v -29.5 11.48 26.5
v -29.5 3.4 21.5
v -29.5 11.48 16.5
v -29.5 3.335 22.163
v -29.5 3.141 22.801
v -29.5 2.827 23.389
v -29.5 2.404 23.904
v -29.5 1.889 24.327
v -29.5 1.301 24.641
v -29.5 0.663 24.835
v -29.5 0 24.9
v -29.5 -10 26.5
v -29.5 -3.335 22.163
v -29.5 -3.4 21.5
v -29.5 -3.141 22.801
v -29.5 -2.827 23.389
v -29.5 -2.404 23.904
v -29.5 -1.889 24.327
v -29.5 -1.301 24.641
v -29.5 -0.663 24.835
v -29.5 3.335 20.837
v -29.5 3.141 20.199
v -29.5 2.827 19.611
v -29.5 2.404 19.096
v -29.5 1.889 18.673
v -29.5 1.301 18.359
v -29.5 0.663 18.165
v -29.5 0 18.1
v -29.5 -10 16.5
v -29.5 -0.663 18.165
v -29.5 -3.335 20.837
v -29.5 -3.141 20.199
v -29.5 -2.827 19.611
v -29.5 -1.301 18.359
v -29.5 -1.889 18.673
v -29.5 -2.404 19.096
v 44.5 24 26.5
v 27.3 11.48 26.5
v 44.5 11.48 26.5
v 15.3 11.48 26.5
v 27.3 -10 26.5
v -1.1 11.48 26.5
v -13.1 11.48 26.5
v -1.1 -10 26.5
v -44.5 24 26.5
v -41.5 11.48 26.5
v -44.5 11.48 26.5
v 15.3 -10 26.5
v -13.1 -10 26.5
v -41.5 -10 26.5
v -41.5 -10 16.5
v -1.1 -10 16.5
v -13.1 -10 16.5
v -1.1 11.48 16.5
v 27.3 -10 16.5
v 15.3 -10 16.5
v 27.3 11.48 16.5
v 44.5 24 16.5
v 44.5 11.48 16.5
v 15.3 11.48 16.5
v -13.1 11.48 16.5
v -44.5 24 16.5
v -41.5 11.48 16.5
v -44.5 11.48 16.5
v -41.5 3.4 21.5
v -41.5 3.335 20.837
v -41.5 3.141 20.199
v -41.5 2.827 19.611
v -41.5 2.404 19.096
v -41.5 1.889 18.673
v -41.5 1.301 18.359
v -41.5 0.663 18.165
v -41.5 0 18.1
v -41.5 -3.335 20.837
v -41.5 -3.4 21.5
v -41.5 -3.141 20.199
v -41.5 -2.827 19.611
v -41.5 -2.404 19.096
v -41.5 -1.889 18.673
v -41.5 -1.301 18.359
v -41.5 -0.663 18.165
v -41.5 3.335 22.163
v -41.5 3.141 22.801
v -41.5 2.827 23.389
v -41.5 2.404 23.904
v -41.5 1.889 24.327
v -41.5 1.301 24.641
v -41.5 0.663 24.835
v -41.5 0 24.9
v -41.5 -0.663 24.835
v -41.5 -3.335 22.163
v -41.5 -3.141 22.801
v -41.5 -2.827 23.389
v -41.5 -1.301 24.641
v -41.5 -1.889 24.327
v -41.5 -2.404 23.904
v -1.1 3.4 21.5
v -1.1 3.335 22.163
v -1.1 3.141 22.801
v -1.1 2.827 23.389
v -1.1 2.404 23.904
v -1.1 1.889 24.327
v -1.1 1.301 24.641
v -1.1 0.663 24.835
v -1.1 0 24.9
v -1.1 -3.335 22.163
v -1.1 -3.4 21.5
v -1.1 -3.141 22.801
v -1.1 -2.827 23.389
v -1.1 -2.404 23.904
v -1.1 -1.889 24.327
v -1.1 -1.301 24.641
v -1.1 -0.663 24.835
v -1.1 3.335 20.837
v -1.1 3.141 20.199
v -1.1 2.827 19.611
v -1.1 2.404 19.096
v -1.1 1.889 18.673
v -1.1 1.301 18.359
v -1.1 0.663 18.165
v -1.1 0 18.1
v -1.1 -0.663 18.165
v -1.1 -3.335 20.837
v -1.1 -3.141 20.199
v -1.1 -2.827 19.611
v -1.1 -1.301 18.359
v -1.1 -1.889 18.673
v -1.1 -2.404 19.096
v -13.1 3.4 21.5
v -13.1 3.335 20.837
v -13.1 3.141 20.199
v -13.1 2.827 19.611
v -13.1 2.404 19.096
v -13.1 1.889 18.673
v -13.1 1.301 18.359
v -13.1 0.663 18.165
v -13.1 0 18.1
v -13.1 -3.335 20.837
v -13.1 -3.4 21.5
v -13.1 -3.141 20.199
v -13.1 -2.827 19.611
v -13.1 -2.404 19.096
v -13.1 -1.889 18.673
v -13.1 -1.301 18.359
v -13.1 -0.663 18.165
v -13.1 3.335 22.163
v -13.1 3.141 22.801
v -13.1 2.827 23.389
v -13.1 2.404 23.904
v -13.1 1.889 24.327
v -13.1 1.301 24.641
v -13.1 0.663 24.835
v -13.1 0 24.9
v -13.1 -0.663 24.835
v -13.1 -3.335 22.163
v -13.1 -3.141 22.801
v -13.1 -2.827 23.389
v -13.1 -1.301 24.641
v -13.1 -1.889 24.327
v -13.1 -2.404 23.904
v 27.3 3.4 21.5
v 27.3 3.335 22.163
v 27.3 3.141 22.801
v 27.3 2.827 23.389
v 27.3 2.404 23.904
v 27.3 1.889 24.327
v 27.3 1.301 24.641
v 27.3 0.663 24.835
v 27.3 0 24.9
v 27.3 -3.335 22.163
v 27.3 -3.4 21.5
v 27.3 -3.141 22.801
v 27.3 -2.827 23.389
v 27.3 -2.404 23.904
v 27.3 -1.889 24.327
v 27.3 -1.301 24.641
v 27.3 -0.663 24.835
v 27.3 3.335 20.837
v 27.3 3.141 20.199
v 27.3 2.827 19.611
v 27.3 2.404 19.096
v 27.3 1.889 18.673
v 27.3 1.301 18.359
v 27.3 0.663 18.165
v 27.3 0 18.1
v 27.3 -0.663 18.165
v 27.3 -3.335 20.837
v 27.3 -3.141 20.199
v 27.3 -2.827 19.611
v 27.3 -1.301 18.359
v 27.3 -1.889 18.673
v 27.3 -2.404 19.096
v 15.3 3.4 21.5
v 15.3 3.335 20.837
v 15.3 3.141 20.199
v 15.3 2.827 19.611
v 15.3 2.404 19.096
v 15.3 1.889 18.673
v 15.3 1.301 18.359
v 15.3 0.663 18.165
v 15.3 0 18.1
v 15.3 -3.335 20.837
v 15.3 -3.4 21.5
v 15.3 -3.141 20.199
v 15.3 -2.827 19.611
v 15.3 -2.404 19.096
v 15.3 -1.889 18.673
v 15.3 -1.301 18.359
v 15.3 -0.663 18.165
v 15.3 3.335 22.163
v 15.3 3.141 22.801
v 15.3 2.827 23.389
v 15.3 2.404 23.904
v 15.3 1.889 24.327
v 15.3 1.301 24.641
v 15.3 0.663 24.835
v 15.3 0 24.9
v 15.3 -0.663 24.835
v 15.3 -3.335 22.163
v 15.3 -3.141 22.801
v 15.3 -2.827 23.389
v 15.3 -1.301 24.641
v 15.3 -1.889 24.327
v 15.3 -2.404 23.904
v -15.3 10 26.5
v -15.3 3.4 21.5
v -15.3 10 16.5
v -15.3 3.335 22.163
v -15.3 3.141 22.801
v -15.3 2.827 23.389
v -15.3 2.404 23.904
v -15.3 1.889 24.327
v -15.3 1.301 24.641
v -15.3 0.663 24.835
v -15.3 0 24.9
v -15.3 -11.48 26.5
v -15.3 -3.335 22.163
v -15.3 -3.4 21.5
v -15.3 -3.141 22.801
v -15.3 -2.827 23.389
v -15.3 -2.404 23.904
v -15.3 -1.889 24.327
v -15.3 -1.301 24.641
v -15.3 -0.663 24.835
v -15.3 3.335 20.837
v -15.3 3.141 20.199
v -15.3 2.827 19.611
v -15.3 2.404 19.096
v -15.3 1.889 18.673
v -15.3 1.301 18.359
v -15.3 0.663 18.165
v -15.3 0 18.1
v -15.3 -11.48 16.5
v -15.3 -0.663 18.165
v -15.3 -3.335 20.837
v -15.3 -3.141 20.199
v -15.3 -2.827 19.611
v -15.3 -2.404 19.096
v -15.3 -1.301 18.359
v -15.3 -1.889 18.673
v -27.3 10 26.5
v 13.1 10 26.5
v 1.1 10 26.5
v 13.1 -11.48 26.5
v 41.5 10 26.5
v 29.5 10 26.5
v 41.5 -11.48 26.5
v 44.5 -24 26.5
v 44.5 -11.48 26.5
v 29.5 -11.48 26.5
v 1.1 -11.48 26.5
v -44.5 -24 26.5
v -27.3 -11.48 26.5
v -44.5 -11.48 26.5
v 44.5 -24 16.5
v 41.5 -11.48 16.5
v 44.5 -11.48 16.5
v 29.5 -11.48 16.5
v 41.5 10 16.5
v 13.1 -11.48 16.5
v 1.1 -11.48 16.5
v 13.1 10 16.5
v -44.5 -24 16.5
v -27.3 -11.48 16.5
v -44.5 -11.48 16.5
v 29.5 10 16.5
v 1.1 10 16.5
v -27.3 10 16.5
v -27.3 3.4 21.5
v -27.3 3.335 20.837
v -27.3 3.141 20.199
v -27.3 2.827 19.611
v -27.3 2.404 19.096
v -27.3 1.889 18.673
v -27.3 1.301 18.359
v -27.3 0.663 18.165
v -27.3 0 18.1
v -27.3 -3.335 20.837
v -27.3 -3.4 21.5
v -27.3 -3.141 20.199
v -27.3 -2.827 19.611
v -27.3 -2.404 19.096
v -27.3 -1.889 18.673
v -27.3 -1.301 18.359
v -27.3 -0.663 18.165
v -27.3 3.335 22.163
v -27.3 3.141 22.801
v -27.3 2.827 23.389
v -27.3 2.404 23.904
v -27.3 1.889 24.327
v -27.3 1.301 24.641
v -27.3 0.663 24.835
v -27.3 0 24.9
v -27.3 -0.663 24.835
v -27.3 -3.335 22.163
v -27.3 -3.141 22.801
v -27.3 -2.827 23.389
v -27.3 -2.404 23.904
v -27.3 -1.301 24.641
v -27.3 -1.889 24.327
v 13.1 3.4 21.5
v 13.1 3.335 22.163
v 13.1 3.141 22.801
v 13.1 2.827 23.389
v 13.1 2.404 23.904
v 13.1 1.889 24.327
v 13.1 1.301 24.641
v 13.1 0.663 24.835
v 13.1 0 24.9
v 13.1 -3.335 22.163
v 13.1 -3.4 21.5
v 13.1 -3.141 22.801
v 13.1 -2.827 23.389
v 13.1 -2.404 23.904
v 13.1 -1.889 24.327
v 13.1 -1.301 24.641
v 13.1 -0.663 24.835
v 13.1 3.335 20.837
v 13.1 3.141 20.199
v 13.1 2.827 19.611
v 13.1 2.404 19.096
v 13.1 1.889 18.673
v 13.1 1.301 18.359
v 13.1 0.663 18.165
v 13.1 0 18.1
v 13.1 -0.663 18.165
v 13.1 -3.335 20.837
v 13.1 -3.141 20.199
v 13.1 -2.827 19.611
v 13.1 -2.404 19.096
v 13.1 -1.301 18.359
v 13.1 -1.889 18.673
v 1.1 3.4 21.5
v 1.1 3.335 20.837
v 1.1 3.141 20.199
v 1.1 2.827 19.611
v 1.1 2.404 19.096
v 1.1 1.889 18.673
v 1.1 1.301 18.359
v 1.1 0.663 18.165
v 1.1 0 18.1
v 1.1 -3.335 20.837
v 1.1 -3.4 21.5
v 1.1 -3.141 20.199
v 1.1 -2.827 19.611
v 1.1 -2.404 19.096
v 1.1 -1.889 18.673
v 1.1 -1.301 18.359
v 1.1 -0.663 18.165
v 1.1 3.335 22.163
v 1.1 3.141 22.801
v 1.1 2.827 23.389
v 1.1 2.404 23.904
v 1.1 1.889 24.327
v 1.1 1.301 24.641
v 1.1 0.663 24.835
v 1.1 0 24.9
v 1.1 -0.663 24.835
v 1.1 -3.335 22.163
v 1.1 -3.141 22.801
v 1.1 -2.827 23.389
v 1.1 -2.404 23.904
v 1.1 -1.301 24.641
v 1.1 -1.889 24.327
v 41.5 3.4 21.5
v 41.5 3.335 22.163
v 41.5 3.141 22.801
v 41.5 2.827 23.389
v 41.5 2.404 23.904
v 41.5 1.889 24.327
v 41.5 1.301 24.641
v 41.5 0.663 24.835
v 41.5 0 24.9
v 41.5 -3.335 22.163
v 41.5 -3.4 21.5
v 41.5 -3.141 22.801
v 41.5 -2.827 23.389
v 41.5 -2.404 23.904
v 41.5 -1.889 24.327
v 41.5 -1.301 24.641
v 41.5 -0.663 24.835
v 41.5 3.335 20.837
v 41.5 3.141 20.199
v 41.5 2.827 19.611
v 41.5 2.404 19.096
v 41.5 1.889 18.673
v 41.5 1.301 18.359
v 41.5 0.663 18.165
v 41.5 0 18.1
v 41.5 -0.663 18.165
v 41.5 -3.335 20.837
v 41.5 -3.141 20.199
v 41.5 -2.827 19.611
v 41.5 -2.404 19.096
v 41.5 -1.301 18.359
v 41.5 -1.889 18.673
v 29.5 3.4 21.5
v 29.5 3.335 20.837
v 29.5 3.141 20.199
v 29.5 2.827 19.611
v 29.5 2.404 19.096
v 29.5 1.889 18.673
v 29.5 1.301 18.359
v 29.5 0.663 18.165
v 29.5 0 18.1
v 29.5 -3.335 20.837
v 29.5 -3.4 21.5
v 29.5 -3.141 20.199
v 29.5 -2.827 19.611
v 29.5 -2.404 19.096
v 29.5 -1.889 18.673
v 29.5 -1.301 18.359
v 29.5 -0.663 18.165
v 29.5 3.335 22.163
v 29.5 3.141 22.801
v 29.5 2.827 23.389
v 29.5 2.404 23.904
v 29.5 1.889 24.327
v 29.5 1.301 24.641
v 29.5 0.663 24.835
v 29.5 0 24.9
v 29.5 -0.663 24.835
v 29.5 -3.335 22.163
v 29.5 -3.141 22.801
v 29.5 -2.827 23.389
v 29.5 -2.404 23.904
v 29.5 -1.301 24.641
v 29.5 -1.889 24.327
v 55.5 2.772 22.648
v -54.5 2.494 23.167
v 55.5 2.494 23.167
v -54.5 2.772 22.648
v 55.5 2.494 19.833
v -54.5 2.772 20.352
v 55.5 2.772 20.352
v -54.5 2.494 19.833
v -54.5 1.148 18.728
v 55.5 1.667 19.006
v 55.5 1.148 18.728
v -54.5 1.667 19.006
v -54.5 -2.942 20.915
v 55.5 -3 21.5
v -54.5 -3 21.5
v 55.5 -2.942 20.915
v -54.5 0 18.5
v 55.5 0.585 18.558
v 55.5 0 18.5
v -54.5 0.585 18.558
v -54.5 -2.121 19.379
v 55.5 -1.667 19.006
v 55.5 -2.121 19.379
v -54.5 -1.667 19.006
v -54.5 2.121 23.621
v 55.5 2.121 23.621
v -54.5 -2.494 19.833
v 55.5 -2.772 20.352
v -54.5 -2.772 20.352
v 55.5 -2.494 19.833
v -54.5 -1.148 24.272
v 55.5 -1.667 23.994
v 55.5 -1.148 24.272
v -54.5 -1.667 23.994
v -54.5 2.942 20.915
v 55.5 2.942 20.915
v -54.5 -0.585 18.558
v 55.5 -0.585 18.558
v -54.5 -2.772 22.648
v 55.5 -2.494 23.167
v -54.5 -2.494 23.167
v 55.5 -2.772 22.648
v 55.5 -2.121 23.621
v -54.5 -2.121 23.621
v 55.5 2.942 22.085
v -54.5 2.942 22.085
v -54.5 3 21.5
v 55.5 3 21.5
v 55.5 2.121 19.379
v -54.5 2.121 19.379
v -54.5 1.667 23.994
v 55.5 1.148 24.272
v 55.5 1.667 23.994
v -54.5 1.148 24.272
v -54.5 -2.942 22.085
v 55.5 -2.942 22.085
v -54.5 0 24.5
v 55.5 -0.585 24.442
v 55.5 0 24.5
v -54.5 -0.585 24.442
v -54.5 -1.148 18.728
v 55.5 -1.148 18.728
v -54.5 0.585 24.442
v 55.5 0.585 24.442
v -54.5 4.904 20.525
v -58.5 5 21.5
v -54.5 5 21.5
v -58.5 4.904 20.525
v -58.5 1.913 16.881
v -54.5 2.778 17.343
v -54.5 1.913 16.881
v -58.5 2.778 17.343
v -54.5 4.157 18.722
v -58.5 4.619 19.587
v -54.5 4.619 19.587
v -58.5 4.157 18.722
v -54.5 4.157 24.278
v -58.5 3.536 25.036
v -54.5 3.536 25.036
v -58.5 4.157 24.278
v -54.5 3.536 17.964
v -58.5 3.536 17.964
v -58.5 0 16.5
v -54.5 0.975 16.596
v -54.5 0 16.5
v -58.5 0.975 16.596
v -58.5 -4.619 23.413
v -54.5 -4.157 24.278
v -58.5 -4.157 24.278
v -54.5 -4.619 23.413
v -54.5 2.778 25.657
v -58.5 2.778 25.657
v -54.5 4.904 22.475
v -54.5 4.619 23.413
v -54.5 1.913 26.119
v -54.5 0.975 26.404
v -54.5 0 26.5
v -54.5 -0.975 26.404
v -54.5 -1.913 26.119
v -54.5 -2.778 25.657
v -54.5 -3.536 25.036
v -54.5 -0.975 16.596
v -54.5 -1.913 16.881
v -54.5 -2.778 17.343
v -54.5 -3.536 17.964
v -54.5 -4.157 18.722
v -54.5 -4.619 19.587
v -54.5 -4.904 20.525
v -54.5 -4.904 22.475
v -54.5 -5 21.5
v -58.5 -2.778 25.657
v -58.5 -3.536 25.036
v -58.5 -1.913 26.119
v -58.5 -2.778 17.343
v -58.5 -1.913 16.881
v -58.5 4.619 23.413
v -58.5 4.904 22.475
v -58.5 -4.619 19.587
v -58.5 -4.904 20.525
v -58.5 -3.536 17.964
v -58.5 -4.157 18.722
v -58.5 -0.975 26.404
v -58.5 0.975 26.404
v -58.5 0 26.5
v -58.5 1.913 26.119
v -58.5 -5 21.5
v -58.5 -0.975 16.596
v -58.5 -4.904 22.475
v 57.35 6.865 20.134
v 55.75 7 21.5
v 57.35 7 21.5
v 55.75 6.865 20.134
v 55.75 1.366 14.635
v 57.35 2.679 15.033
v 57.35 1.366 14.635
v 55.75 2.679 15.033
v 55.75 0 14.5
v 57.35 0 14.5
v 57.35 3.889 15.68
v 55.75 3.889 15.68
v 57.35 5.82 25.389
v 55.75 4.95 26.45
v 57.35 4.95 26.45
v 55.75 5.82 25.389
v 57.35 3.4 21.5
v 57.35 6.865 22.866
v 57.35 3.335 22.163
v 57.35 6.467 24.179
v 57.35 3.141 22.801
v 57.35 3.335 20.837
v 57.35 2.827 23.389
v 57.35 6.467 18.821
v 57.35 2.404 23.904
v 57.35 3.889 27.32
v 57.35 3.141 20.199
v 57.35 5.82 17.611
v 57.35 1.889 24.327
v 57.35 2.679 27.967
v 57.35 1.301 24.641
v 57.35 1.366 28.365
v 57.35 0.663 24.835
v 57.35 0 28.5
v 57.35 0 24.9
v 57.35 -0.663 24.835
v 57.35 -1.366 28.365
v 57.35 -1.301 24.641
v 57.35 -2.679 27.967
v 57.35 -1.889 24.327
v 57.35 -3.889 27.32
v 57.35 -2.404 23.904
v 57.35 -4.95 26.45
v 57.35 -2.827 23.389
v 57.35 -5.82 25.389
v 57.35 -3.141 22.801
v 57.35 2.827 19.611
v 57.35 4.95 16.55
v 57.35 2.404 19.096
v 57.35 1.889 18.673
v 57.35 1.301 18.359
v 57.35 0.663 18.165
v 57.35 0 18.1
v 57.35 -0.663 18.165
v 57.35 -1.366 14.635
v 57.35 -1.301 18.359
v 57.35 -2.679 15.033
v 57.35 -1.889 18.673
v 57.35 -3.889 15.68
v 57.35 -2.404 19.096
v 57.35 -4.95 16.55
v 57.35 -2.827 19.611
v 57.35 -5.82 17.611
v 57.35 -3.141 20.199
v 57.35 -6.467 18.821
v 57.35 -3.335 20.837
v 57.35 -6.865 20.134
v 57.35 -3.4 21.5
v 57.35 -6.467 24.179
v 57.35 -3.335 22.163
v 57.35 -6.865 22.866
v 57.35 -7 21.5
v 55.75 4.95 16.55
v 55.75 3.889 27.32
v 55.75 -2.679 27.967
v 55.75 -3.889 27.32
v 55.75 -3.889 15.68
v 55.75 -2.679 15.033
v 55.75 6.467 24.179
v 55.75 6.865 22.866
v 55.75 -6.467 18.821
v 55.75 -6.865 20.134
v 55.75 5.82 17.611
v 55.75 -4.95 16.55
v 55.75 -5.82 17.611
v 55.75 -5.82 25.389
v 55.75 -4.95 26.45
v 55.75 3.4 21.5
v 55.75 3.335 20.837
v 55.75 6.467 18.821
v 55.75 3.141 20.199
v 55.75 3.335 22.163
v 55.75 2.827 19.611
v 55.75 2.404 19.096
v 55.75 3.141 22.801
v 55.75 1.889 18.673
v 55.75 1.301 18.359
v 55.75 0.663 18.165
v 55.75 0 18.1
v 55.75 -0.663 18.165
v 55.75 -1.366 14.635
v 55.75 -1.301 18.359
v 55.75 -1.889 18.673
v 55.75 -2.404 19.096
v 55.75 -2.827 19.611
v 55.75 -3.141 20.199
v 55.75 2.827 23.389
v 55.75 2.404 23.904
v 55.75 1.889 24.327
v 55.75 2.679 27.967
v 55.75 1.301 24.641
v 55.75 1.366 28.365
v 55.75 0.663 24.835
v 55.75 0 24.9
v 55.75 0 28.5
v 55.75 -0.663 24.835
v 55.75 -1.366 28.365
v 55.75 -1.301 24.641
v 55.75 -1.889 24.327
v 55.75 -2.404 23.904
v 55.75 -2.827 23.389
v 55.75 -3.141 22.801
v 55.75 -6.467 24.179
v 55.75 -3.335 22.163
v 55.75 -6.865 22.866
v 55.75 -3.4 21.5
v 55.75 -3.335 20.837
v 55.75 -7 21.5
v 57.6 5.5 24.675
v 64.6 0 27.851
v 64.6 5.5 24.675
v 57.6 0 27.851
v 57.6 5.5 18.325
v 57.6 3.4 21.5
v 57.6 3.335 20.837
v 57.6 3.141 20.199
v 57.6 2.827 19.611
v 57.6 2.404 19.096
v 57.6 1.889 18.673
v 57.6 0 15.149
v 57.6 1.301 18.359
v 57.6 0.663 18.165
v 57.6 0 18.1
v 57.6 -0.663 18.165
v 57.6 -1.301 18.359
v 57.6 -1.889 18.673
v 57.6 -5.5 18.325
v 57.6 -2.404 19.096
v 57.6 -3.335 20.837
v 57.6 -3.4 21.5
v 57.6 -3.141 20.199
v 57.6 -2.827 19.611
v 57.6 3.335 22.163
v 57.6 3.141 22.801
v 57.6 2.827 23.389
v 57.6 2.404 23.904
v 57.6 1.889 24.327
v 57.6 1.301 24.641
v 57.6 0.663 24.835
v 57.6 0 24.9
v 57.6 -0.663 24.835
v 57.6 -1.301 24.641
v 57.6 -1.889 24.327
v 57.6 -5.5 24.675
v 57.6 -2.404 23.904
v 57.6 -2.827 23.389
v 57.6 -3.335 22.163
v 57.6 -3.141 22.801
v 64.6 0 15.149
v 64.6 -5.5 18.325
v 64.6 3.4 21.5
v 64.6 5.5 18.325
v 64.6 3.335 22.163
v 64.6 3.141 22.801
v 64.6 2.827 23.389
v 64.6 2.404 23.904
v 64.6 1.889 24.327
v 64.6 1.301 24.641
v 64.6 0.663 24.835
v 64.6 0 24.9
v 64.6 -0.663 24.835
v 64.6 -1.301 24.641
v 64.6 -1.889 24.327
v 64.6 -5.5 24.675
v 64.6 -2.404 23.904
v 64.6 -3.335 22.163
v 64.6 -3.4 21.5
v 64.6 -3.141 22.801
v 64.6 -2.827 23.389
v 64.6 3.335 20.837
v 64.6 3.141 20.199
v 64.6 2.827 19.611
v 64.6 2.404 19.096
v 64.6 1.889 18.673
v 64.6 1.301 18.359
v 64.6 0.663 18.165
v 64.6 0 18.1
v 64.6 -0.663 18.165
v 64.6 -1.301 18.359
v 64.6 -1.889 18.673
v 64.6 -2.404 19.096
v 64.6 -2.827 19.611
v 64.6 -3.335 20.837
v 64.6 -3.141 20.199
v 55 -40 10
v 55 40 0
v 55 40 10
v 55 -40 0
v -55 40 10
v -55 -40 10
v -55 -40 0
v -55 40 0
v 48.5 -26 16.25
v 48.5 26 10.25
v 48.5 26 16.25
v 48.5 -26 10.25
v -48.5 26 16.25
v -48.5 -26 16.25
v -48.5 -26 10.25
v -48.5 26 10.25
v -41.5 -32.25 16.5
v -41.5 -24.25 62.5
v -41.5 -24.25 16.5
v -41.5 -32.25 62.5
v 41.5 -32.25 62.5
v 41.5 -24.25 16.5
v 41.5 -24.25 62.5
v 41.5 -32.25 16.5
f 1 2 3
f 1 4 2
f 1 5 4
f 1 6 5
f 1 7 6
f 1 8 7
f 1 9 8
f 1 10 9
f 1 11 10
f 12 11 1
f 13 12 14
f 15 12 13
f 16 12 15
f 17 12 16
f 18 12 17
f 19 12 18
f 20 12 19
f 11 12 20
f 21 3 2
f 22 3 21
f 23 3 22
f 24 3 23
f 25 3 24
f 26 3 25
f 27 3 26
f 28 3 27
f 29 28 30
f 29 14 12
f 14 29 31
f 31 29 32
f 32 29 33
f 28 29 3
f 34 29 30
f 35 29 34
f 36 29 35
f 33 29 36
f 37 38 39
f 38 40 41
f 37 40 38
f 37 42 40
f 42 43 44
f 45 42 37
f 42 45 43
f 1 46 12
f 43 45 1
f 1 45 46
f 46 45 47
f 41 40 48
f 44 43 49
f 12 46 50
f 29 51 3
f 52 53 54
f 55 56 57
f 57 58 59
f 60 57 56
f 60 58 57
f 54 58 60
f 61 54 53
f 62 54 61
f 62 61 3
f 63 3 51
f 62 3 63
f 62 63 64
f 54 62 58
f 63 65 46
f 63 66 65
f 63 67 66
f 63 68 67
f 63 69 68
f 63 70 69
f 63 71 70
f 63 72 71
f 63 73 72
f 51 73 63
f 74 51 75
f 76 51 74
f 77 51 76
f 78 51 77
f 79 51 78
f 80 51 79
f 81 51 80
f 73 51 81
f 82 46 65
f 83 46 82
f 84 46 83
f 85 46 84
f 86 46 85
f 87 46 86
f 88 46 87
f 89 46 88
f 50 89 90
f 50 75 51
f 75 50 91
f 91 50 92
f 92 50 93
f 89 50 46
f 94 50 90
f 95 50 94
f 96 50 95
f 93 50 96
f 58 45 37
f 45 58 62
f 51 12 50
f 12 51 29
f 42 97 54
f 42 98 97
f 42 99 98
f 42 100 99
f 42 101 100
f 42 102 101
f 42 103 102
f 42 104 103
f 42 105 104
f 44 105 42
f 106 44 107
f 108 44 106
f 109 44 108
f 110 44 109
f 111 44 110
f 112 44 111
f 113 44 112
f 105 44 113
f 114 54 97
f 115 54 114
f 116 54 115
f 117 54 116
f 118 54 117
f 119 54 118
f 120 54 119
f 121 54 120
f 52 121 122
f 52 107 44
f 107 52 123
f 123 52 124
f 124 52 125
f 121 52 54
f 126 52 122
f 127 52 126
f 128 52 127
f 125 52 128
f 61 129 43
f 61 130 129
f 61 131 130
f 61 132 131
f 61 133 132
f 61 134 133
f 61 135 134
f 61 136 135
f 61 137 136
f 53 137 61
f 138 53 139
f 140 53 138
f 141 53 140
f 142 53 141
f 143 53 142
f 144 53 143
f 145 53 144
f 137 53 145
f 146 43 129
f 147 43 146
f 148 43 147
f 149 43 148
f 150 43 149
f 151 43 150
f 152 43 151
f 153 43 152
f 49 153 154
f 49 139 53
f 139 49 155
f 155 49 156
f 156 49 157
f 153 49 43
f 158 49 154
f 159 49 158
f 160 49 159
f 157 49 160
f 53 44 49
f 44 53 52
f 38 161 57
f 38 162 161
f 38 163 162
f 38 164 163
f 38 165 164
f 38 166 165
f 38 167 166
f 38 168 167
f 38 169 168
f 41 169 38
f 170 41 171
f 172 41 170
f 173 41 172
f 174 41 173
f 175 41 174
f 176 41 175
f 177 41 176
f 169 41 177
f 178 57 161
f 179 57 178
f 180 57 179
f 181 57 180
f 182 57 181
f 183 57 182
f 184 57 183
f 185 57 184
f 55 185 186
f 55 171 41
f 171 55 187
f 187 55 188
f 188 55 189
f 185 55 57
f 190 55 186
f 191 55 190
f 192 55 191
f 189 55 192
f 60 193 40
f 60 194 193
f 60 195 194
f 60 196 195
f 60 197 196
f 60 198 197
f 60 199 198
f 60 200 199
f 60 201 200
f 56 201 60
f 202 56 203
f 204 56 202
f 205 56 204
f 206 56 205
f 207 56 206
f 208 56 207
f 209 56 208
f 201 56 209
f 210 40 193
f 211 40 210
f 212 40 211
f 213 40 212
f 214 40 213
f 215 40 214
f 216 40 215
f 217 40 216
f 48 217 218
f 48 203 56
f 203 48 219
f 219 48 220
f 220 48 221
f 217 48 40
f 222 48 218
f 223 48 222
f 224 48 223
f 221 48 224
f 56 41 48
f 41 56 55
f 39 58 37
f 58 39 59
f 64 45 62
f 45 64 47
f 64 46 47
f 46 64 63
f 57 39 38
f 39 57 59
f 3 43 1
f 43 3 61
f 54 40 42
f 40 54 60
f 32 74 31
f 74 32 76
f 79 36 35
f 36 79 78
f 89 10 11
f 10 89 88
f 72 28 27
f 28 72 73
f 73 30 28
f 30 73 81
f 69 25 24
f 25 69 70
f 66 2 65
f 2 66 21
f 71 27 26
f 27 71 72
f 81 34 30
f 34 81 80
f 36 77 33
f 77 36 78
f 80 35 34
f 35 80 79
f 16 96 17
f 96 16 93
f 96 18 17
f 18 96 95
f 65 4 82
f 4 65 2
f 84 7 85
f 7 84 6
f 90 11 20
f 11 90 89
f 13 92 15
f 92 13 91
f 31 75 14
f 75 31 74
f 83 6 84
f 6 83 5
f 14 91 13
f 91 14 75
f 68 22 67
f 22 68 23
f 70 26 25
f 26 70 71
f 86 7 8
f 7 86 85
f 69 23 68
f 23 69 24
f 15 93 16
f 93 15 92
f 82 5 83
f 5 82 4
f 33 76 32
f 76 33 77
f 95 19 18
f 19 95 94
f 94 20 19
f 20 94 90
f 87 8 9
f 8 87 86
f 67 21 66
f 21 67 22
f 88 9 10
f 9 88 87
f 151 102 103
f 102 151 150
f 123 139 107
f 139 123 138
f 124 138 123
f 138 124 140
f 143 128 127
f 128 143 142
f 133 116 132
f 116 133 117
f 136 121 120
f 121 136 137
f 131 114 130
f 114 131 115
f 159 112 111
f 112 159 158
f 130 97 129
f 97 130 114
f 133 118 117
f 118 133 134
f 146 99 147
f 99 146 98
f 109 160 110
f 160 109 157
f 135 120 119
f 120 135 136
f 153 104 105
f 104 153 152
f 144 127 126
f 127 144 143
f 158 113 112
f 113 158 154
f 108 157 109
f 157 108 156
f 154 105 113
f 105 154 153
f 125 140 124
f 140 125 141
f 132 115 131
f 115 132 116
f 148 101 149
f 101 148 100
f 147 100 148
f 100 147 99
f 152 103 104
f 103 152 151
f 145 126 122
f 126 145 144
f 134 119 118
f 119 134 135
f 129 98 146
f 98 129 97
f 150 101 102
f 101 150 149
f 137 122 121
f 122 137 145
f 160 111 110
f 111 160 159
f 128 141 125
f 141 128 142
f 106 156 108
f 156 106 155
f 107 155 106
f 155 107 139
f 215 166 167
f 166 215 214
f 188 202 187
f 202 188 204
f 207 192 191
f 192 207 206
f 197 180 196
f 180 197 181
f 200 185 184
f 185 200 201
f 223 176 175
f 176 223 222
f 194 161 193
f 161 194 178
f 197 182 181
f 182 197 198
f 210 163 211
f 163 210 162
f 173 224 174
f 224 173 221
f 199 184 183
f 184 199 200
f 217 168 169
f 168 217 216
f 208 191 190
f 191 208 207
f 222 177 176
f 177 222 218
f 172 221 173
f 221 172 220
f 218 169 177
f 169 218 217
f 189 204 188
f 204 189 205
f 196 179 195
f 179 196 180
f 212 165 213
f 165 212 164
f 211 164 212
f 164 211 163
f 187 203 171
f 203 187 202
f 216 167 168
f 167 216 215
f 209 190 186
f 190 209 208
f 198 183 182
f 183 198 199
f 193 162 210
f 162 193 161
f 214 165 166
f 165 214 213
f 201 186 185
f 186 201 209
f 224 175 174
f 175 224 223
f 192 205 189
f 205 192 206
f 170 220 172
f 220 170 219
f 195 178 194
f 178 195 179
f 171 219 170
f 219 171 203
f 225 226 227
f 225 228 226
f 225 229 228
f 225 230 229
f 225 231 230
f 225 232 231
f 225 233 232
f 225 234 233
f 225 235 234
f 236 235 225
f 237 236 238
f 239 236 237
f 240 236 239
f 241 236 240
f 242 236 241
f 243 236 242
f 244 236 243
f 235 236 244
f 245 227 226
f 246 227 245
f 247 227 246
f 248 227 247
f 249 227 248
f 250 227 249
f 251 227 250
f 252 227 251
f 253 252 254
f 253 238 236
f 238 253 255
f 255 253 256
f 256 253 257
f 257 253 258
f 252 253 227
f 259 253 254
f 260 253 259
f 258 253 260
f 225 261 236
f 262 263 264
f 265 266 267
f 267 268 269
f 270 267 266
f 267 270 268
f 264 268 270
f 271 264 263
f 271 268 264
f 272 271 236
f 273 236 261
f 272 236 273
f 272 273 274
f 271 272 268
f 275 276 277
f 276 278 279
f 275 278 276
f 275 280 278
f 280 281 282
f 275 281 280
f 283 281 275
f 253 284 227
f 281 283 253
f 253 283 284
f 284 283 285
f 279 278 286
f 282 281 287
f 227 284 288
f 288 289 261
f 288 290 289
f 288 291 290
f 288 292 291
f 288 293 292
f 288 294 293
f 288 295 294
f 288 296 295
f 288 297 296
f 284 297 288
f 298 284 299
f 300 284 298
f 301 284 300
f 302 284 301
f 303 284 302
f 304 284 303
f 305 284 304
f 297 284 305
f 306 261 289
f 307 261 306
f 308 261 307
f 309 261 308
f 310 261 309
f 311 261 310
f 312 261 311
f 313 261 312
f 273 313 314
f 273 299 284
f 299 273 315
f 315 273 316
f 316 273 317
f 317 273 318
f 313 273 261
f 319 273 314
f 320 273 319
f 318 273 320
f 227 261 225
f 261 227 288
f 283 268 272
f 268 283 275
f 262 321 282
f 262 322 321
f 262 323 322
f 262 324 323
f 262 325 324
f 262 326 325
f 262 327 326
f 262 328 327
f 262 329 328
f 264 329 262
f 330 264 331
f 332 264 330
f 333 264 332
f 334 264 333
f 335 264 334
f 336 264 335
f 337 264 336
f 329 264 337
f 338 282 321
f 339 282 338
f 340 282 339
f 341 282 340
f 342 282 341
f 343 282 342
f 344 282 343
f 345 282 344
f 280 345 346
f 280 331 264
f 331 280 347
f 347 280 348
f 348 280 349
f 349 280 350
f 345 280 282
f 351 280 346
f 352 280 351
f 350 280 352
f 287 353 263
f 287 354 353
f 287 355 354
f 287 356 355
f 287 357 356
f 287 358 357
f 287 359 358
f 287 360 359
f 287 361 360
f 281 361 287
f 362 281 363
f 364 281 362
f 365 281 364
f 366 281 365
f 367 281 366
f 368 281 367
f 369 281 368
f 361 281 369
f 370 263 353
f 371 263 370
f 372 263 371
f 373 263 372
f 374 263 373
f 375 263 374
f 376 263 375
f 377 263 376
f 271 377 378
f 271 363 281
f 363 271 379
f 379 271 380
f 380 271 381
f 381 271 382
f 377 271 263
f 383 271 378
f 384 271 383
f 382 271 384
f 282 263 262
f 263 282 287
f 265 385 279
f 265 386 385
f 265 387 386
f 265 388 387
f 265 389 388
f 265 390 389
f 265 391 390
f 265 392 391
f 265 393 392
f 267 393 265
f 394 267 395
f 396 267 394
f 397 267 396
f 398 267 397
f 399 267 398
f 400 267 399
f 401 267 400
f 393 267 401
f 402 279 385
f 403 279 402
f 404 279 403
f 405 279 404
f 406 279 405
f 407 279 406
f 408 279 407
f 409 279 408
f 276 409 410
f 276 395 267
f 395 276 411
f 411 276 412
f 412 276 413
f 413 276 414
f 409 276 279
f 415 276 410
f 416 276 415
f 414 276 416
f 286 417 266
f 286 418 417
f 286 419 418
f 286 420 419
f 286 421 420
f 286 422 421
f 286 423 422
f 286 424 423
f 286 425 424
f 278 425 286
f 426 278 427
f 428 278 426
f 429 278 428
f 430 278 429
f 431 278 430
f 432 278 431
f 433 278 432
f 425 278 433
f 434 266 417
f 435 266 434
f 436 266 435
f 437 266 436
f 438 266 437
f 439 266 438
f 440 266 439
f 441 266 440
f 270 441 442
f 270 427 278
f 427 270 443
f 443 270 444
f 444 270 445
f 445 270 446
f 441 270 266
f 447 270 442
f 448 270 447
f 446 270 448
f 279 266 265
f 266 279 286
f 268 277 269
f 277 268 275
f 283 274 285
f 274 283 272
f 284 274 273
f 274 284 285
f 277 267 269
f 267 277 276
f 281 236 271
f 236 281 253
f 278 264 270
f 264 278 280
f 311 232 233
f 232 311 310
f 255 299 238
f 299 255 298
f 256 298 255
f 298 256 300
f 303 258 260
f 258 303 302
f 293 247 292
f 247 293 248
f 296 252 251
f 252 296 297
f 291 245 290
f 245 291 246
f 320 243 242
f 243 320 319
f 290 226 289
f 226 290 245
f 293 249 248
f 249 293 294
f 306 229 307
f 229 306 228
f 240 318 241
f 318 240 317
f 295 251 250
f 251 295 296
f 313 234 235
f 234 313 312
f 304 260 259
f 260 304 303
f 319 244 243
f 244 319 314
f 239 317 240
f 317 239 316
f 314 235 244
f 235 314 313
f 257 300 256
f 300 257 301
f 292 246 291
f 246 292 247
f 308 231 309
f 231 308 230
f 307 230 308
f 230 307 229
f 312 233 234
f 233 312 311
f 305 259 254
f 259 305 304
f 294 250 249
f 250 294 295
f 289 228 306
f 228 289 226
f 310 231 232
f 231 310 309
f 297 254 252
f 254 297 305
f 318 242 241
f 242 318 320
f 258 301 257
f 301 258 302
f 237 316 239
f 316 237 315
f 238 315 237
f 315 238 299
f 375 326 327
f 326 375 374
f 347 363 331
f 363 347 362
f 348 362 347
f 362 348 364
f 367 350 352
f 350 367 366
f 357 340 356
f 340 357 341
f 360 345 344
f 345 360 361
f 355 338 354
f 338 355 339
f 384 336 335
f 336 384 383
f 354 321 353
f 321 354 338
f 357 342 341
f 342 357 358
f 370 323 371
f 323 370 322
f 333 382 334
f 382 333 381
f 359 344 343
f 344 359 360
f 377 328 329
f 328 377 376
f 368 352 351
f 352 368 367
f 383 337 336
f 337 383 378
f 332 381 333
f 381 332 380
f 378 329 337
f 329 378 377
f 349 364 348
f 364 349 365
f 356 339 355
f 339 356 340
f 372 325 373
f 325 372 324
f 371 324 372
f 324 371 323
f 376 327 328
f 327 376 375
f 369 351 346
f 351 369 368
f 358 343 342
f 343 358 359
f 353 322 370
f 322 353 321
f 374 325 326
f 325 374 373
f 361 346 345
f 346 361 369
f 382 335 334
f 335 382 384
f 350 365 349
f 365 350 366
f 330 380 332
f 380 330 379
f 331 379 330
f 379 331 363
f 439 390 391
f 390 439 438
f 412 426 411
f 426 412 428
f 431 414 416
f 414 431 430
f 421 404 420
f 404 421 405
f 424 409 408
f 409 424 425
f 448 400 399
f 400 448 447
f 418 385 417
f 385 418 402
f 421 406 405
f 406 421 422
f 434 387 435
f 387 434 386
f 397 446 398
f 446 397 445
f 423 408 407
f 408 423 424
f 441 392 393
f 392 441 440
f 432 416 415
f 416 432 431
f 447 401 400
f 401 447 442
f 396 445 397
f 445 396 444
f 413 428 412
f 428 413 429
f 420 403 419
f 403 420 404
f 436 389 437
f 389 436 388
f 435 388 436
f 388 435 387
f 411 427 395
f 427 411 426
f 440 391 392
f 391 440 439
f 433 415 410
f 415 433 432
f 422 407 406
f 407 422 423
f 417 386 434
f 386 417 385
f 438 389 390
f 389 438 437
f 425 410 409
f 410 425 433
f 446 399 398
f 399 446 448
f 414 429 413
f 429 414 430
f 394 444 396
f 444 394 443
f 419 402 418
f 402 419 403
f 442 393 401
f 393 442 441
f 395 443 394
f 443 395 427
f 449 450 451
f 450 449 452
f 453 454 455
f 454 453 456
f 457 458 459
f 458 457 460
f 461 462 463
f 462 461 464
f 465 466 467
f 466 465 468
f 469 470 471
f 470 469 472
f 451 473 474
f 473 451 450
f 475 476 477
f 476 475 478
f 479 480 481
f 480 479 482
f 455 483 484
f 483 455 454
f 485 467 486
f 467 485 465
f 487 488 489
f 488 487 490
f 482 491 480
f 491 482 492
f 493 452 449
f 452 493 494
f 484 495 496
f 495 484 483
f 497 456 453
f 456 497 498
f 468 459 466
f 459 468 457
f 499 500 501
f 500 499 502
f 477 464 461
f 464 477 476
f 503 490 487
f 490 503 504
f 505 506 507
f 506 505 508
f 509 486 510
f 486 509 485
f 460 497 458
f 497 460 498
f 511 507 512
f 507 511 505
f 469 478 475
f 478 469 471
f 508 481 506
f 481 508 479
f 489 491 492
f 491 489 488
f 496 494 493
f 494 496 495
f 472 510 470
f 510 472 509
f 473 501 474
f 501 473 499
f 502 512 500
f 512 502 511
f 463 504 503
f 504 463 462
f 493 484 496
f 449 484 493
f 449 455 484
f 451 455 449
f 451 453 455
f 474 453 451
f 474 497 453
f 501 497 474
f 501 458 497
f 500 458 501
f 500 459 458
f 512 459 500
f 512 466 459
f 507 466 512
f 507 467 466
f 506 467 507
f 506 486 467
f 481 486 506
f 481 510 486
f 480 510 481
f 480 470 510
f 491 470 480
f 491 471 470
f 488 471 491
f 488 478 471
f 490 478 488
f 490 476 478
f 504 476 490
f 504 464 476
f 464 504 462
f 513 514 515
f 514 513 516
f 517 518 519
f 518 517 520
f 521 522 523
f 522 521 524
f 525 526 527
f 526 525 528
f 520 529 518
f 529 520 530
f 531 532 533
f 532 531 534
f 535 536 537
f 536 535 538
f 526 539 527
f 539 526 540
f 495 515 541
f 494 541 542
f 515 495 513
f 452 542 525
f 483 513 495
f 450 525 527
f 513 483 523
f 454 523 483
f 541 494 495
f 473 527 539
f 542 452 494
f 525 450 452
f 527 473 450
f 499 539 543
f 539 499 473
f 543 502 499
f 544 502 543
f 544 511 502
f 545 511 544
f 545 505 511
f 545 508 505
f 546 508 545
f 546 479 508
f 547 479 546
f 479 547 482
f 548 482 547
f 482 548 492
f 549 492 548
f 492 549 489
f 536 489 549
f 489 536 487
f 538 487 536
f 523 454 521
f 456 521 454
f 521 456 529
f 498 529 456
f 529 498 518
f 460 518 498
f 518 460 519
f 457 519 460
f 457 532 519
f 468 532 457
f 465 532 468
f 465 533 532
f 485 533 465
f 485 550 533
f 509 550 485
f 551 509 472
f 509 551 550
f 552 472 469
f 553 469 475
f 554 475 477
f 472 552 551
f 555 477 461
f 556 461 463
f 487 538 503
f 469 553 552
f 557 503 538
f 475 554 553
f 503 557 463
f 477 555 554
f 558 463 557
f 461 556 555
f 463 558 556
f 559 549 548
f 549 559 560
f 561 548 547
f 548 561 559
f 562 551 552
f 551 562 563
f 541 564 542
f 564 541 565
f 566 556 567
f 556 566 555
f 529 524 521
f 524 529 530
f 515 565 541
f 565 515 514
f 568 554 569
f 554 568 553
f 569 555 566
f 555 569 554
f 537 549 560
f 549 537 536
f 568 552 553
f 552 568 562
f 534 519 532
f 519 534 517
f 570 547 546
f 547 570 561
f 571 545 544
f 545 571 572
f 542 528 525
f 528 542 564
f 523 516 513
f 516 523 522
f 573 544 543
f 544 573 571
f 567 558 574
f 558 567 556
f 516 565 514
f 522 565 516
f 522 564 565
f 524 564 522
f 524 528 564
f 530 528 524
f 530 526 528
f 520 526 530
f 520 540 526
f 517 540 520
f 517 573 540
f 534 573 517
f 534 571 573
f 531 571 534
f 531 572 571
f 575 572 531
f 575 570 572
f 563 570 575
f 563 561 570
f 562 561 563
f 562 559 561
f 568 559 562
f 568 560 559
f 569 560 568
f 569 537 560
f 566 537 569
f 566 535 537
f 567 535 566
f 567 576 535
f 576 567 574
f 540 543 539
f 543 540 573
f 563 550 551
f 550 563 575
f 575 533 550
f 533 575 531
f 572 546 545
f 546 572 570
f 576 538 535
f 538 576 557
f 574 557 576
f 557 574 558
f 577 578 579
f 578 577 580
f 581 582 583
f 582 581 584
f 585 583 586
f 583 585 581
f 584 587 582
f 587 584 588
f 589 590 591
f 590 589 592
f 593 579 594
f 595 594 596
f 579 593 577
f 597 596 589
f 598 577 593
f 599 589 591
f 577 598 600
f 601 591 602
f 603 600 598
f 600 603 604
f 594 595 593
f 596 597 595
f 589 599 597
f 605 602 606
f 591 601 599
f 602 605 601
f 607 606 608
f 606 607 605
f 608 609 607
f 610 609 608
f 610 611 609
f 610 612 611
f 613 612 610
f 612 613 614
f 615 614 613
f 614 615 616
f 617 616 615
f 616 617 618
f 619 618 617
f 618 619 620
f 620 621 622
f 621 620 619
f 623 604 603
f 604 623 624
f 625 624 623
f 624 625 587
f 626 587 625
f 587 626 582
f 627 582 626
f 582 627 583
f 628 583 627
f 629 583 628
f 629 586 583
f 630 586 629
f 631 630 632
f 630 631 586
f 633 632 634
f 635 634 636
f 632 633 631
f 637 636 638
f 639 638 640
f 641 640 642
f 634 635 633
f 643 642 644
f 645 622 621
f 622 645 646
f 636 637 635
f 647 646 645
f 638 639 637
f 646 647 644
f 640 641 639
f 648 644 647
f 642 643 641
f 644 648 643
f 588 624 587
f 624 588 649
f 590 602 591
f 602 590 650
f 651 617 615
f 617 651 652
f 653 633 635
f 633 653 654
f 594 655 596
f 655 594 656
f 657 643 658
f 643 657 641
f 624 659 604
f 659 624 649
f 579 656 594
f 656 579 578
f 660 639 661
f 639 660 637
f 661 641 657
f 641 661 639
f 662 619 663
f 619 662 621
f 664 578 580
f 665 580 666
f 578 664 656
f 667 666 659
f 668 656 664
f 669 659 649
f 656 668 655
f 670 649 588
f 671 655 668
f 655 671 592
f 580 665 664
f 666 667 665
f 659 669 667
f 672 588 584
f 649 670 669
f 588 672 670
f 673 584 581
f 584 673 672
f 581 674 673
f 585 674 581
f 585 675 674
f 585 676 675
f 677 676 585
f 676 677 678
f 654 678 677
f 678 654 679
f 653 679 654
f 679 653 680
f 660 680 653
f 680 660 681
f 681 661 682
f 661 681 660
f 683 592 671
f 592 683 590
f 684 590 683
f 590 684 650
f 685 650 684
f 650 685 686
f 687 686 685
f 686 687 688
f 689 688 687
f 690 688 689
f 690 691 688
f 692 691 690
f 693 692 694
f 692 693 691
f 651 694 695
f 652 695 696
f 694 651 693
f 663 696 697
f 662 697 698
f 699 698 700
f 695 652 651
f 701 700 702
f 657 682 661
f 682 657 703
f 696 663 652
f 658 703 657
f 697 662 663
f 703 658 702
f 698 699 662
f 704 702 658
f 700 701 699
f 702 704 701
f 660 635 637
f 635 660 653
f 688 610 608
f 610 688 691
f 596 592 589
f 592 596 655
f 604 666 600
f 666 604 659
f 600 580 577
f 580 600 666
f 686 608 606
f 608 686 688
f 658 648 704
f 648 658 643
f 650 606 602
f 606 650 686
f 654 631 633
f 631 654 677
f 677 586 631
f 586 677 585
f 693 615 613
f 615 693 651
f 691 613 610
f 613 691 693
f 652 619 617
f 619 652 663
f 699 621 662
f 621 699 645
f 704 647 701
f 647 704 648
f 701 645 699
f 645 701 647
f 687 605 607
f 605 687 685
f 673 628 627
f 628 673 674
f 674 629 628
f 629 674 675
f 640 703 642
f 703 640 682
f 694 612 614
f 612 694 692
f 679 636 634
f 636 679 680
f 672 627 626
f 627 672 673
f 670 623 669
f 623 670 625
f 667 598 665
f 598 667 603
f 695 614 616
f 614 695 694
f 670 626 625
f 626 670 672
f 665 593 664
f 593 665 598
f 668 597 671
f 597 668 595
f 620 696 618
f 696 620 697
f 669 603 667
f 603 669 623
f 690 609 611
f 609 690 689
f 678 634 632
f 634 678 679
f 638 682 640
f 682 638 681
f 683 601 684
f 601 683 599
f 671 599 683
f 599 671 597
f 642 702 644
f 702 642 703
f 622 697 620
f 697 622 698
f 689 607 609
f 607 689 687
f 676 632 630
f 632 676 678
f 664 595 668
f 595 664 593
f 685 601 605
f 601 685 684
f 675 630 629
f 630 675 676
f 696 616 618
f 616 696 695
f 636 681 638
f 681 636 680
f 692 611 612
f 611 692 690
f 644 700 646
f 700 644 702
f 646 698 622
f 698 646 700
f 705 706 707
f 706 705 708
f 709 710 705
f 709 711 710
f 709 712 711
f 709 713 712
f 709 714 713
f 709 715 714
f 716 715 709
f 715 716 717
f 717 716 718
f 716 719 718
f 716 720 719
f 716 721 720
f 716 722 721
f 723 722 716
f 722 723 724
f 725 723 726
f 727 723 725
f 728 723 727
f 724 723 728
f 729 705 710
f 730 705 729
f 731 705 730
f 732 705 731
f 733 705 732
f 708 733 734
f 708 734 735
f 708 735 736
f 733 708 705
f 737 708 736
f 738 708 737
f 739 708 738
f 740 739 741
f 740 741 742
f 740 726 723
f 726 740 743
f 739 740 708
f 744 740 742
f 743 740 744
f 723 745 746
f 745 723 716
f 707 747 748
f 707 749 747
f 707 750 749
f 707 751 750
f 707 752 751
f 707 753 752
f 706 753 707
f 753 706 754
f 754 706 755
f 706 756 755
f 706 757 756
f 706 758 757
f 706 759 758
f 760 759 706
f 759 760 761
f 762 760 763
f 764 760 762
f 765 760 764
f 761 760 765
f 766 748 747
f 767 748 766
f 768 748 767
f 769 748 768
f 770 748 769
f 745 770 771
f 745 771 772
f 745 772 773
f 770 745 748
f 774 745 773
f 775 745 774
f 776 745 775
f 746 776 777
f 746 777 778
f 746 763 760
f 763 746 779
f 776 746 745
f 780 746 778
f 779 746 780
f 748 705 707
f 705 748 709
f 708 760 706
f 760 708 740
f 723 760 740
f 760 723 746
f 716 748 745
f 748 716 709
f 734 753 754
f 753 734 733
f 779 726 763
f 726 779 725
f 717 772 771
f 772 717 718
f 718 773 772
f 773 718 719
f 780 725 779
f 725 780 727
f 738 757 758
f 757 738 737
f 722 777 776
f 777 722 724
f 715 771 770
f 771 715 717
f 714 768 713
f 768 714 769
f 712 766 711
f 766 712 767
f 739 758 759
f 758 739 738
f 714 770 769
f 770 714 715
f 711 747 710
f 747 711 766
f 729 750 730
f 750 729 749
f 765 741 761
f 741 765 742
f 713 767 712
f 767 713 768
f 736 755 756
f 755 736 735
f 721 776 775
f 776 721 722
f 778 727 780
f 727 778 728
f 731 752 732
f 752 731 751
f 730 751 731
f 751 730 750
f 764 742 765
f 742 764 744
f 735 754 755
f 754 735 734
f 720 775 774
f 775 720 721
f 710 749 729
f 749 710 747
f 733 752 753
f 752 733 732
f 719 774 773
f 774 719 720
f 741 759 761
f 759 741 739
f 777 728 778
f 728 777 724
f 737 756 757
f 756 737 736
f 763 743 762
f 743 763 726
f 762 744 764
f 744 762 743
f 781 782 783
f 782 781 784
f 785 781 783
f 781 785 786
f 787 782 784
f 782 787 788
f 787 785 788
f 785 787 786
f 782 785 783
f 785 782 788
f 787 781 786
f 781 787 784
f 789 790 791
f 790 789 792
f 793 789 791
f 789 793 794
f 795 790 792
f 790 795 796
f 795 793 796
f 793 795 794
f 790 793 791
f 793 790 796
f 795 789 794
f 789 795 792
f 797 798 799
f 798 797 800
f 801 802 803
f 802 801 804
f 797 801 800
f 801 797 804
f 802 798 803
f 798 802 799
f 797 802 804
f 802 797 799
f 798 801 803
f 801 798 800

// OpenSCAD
$fn = 32;

// ------------------------------------------------------------------------
// Comb hinge with flap: leaf 89 x 24 mm, pin d6, flap 46 mm
// Every part is its own module, assembly() places every instance.
// ------------------------------------------------------------------------

// --- part 1 ---
module hinge_bed() {
  difference() {
    translate([-55, -40, 0]) cube([110, 80, 10]);
  }
}

// --- part 2 ---
module hinge_riser() {
  difference() {
    translate([-48.5, -26, 0]) cube([97, 52, 6]);
  }
}

// --- part 3 ---
module hinge_leaf_a() {
  difference() {
    union() {
      translate([-41.5, -10, -5]) cube([12, 34, 10]);
      translate([-13.1, -10, -5]) cube([12, 34, 10]);
      translate([15.3, -10, -5]) cube([12, 34, 10]);
      translate([-44.5, 11.48, -5]) cube([89, 12.52, 10]);
    }
    translate([-35.5, 0, 0]) rotate([0, 90, 0]) cylinder(h = 14, d = 6.8, center = true);
    translate([-7.1, 0, 0]) rotate([0, 90, 0]) cylinder(h = 14, d = 6.8, center = true);
    translate([21.3, 0, 0]) rotate([0, 90, 0]) cylinder(h = 14, d = 6.8, center = true);
  }
}

// --- part 4 ---
module hinge_leaf_b() {
  difference() {
    union() {
      translate([-27.3, -24, -5]) cube([12, 34, 10]);
      translate([1.1, -24, -5]) cube([12, 34, 10]);
      translate([29.5, -24, -5]) cube([12, 34, 10]);
      translate([-44.5, -24, -5]) cube([89, 12.52, 10]);
    }
    translate([-21.3, 0, 0]) rotate([0, 90, 0]) cylinder(h = 14, d = 6.8, center = true);
    translate([7.1, 0, 0]) rotate([0, 90, 0]) cylinder(h = 14, d = 6.8, center = true);
    translate([35.5, 0, 0]) rotate([0, 90, 0]) cylinder(h = 14, d = 6.8, center = true);
  }
}

// --- part 5 ---
module hinge_flap() {
  difference() {
    translate([-41.5, -23, 0]) cube([83, 46, 8]);
  }
}

// --- part 6 ---
module hinge_pin() {
  rotate([0, 90, 0]) cylinder(h = 111, d = 6, center = true);
  translate([-58.5, 0, 0]) rotate([0, 90, 0]) cylinder(h = 4, d = 10);
}

// --- part 7 ---
module pin_washer() {
  difference() {
      translate([0, 0, 0]) cylinder(h = 1.6, d = 14);
      translate([0, 0, -1]) cylinder(h = 3.6, d = 6.8);
    }
}

// --- part 8 ---
module pin_nut() {
  difference() {
    linear_extrude(height = 7) polygon(points = [[6.351, 0], [3.175, 5.5], [-3.175, 5.5], [-6.351, 0], [-3.175, -5.5], [3.175, -5.5]]);
    translate([0, 0, -1]) cylinder(h = 9, d = 6.8);
  }
}

// --- assembly ---
module assembly() {
  color([0.80, 0.24, 0.20]) translate([0, 0, 0]) rotate([0, 0, 0]) hinge_bed();
  color([0.20, 0.45, 0.75]) translate([0, 0, 10.25]) rotate([0, 0, 0]) hinge_riser();
  color([0.25, 0.62, 0.32]) translate([0, 0, 21.5]) rotate([0, 0, 0]) hinge_leaf_a();
  color([0.92, 0.70, 0.18]) translate([0, 0, 21.5]) rotate([0, 0, 0]) hinge_leaf_b();
  color([0.58, 0.35, 0.70]) translate([0, -24.25, 39.5]) rotate([90, 0, 0]) hinge_flap();
  color([0.16, 0.66, 0.66]) translate([0, 0, 21.5]) rotate([0, 0, 0]) hinge_pin();
  color([0.85, 0.48, 0.18]) translate([55.75, 0, 21.5]) rotate([0, 90, 0]) pin_washer();
  color([0.55, 0.60, 0.65]) translate([57.6, 0, 21.5]) rotate([0, 90, 0]) pin_nut();
}

assembly();
